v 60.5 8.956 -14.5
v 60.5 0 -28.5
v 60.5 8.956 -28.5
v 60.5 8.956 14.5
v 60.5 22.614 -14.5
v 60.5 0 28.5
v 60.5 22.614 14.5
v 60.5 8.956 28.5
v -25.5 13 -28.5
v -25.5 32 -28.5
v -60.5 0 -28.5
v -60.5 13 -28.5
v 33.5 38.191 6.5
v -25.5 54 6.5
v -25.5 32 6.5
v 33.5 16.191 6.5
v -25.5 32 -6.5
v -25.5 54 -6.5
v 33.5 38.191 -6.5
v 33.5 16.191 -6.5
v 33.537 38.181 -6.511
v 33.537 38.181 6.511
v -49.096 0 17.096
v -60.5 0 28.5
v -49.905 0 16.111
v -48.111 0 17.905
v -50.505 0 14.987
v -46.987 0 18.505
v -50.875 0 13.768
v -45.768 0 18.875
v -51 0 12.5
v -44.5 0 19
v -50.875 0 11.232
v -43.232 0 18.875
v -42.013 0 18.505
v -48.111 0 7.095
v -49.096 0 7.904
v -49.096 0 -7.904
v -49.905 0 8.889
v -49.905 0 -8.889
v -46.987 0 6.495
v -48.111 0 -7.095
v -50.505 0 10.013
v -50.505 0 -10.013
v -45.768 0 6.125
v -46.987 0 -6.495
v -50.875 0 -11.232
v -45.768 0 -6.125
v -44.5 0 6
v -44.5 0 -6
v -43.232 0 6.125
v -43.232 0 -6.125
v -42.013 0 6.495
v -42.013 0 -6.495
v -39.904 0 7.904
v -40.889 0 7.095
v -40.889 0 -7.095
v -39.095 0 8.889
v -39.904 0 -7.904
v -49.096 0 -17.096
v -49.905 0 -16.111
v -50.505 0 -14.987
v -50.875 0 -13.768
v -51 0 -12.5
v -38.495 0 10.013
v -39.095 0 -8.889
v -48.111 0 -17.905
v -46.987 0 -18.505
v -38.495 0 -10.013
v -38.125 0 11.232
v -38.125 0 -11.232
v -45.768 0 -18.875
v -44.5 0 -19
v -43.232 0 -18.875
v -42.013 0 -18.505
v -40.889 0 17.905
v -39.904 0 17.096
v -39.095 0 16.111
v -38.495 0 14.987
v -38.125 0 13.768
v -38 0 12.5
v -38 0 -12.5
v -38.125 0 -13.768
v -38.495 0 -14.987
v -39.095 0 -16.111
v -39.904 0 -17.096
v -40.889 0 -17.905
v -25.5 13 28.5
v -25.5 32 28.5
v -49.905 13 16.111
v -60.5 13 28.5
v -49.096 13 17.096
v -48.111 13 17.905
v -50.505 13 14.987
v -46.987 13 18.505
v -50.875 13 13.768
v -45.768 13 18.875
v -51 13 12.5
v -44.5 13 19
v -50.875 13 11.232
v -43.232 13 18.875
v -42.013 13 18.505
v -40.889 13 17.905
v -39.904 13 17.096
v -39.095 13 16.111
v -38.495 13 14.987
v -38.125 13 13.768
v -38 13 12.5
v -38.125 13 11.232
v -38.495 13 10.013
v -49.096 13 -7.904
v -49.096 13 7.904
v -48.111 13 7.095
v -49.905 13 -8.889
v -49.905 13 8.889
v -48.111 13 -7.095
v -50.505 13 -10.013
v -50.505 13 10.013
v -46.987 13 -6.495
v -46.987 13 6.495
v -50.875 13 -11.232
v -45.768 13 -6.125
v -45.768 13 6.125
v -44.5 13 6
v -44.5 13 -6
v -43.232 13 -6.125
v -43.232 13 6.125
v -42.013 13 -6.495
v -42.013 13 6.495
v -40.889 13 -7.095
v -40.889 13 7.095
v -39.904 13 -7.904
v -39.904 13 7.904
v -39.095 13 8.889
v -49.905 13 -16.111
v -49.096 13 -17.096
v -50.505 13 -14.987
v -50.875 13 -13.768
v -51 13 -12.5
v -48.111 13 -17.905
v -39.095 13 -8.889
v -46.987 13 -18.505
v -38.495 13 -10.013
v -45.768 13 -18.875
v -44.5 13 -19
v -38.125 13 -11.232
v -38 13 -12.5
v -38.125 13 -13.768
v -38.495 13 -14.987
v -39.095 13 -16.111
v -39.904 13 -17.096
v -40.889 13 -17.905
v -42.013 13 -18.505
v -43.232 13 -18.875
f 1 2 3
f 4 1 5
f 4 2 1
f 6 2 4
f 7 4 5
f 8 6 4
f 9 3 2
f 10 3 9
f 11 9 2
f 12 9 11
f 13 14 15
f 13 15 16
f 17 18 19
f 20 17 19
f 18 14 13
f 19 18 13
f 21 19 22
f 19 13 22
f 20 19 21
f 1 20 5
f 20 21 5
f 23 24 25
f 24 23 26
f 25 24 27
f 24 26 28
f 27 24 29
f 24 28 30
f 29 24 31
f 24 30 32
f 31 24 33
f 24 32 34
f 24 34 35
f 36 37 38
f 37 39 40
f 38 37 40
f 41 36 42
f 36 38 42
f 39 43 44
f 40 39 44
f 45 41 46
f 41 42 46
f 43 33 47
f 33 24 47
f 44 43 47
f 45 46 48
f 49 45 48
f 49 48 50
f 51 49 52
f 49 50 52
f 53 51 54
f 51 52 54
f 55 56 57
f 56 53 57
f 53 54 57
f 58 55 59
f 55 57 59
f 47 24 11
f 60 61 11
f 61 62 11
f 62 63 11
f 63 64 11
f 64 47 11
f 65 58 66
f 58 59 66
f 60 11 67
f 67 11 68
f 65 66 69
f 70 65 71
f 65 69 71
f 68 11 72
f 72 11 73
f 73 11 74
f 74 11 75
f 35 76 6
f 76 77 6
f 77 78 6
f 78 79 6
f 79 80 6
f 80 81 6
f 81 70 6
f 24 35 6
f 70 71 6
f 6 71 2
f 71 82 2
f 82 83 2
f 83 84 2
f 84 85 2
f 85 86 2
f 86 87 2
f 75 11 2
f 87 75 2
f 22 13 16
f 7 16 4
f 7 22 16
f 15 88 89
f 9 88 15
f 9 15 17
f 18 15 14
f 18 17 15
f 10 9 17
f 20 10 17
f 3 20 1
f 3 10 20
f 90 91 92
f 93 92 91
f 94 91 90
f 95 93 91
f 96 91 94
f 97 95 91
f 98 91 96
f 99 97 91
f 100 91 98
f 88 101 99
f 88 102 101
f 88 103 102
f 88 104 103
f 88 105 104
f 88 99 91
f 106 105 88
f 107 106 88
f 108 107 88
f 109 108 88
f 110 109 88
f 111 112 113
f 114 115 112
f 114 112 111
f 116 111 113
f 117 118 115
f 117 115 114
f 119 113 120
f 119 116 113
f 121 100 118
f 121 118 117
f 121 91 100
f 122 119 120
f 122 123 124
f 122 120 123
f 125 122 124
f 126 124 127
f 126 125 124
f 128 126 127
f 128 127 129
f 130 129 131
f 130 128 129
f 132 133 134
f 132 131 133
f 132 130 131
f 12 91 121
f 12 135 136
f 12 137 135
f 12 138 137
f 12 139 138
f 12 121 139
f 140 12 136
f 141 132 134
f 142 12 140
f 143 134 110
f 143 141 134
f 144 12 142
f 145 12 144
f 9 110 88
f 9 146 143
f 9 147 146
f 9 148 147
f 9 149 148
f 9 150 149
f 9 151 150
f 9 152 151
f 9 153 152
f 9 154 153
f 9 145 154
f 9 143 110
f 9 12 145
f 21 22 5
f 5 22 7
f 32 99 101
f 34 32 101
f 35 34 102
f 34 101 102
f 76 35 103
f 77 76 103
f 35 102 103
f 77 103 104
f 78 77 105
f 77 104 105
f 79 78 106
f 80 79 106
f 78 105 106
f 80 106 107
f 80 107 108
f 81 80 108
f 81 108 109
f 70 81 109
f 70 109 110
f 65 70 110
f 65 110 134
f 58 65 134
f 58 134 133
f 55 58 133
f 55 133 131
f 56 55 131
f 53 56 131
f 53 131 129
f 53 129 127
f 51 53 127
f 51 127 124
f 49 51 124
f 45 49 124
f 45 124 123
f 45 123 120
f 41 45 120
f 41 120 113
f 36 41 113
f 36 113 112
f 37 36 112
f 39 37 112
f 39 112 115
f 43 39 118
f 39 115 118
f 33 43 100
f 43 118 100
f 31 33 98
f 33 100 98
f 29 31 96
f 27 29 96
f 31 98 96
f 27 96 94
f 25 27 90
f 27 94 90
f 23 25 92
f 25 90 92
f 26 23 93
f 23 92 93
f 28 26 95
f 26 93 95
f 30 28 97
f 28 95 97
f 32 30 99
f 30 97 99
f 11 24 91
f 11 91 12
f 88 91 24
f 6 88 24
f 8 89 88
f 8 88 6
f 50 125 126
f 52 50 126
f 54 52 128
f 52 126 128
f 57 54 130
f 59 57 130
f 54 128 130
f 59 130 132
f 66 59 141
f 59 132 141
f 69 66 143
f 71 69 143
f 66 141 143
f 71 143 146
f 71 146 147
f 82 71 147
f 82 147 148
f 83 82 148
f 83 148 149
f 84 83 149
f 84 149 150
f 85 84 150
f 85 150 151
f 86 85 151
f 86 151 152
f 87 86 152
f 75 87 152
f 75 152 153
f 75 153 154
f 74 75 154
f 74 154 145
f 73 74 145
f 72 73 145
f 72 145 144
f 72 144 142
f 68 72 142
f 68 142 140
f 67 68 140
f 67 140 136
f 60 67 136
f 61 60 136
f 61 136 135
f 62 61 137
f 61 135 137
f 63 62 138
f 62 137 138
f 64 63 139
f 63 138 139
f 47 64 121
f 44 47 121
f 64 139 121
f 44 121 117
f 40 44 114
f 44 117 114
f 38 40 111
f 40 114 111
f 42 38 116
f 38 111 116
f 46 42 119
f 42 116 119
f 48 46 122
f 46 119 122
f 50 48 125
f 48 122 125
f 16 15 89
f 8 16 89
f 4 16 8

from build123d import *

# Parameters (mm, degrees)
SKETCH1_W           = 121
SKETCH1_H           = 57
BOSS_EXTRUDE1_DEPTH = 13
SKETCH3_W           = 86
SKETCH3_H           = 41
BOSS_EXTRUDE2_DEPTH = 57
CUT_EXTRUDE1_DEPTH  = 41
BOSS_EXTRUDE3_START = -57
BOSS_EXTRUDE3_DEPTH = 57
CUT_EXTRUDE3_DEPTH  = 100.122399083
CUT_EXTRUDE4_REACH  = 101.122
CUT_EXTRUDE5_REACH  = 101.122
SKETCH10_R          = 6.5
CUT_EXTRUDE6_DEPTH  = 79.444247718


with BuildPart() as part:
    # Sketch1 → Boss-Extrude1 (new body)
    with BuildSketch(Plane(origin=(0, 0, 0), x_dir=(1, 0, 0), z_dir=(0, 1, 0))):
        Rectangle(SKETCH1_W, SKETCH1_H)
    extrude(amount=BOSS_EXTRUDE1_DEPTH)

    # Sketch3 → Boss-Extrude2 (add)
    with BuildSketch(Plane.XY.offset(28.5)):
        with Locations((17.5, 33.5)):
            Rectangle(SKETCH3_W, SKETCH3_H)
    extrude(amount=-BOSS_EXTRUDE2_DEPTH)

    # Sketch5 → Cut-Extrude1 (cut)
    with BuildSketch(Plane(origin=(0, 54, 0), x_dir=(1, 0, 0), z_dir=(0, 1, 0))):
        Polygon((-25.5, -6.5), (33.5, -6.5), (60.5, -14.5), (60.5, -28.5), (-25.5, -28.5), align=None)
        Polygon((33.5, 6.5), (60.5, 14.5), (60.5, 28.5), (-25.5, 28.5), (-25.5, 6.5), align=None)
    extrude(amount=-CUT_EXTRUDE1_DEPTH, mode=Mode.SUBTRACT)

    # Sketch6 → Boss-Extrude3 (add)
    with BuildSketch(Plane.XY.offset(28.5).offset(BOSS_EXTRUDE3_START)):
        Polygon((-25.5, 32), (60.5, 8.956369451), (-25.5, 13), align=None)
    extrude(amount=BOSS_EXTRUDE3_DEPTH)

    # Sketch7 → Cut-Extrude3 (cut, through all)
    with BuildSketch(Plane.XY.offset(28.5)):
        Polygon((-25.5, 54), (33.536835762, 38.181127534), (60.5, 22.613937403), (60.5, 54), align=None)
    extrude(amount=-CUT_EXTRUDE3_DEPTH, mode=Mode.SUBTRACT)

    # Cut-Extrude4: up to this face of the body (flat: up to its plane)
    cut_extrude4_end = Plane(part.part.faces().sort_by_distance((45.301820021, 22.632080787, 9.996835562))[0])
    # Sketch8 → Cut-Extrude4 (cut, up to the picked face)
    with BuildSketch(Plane.XY.offset(28.5), mode=Mode.PRIVATE) as cut_extrude4_sk1:
        Polygon((45.408965344, 13), (60.5, 13), (60.5, 8.956369451), align=None)
    cut_extrude4_tool1 = split(extrude(cut_extrude4_sk1.sketch, amount=-CUT_EXTRUDE4_REACH, mode=Mode.PRIVATE), bisect_by=cut_extrude4_end, keep=Keep.BOTH, mode=Mode.PRIVATE)
    add(cut_extrude4_tool1.solids().sort_by(Axis((55.469655, 11.652123, 28.5), (0, 0, -1)))[0], mode=Mode.SUBTRACT)

    # Cut-Extrude5: up to this face of the body (flat: up to its plane)
    cut_extrude5_end = Plane(part.part.faces().sort_by_distance((45.301820021, 22.632080787, -9.996835562))[0])
    # Sketch9 → Cut-Extrude5 (cut, up to the picked face)
    with BuildSketch(Plane(origin=(0, 0, -28.5), x_dir=(-1, 0, 0), z_dir=(0, 0, -1)), mode=Mode.PRIVATE) as cut_extrude5_sk1:
        Polygon((-45.408965344, 13), (-60.5, 13), (-60.5, 8.956369451), align=None)
    cut_extrude5_tool1 = split(extrude(cut_extrude5_sk1.sketch, amount=-CUT_EXTRUDE5_REACH, mode=Mode.PRIVATE), bisect_by=cut_extrude5_end, keep=Keep.BOTH, mode=Mode.PRIVATE)
    add(cut_extrude5_tool1.solids().sort_by(Axis((55.469655, 11.652123, -28.5), (0, 0, 1)))[0], mode=Mode.SUBTRACT)

    # Sketch10 → Cut-Extrude6 (cut, through all)
    with BuildSketch(Plane(origin=(0, 13, 0), x_dir=(1, 0, 0), z_dir=(0, 1, 0))):
        with Locations(Location((-44.5, 12.5, 0), (0, 0, 270))):
            Circle(SKETCH10_R)
        with Locations(Location((-44.5, -12.5, 0), (0, 0, 270))):
            Circle(SKETCH10_R)
    extrude(amount=-CUT_EXTRUDE6_DEPTH, mode=Mode.SUBTRACT)


solid = part.part
